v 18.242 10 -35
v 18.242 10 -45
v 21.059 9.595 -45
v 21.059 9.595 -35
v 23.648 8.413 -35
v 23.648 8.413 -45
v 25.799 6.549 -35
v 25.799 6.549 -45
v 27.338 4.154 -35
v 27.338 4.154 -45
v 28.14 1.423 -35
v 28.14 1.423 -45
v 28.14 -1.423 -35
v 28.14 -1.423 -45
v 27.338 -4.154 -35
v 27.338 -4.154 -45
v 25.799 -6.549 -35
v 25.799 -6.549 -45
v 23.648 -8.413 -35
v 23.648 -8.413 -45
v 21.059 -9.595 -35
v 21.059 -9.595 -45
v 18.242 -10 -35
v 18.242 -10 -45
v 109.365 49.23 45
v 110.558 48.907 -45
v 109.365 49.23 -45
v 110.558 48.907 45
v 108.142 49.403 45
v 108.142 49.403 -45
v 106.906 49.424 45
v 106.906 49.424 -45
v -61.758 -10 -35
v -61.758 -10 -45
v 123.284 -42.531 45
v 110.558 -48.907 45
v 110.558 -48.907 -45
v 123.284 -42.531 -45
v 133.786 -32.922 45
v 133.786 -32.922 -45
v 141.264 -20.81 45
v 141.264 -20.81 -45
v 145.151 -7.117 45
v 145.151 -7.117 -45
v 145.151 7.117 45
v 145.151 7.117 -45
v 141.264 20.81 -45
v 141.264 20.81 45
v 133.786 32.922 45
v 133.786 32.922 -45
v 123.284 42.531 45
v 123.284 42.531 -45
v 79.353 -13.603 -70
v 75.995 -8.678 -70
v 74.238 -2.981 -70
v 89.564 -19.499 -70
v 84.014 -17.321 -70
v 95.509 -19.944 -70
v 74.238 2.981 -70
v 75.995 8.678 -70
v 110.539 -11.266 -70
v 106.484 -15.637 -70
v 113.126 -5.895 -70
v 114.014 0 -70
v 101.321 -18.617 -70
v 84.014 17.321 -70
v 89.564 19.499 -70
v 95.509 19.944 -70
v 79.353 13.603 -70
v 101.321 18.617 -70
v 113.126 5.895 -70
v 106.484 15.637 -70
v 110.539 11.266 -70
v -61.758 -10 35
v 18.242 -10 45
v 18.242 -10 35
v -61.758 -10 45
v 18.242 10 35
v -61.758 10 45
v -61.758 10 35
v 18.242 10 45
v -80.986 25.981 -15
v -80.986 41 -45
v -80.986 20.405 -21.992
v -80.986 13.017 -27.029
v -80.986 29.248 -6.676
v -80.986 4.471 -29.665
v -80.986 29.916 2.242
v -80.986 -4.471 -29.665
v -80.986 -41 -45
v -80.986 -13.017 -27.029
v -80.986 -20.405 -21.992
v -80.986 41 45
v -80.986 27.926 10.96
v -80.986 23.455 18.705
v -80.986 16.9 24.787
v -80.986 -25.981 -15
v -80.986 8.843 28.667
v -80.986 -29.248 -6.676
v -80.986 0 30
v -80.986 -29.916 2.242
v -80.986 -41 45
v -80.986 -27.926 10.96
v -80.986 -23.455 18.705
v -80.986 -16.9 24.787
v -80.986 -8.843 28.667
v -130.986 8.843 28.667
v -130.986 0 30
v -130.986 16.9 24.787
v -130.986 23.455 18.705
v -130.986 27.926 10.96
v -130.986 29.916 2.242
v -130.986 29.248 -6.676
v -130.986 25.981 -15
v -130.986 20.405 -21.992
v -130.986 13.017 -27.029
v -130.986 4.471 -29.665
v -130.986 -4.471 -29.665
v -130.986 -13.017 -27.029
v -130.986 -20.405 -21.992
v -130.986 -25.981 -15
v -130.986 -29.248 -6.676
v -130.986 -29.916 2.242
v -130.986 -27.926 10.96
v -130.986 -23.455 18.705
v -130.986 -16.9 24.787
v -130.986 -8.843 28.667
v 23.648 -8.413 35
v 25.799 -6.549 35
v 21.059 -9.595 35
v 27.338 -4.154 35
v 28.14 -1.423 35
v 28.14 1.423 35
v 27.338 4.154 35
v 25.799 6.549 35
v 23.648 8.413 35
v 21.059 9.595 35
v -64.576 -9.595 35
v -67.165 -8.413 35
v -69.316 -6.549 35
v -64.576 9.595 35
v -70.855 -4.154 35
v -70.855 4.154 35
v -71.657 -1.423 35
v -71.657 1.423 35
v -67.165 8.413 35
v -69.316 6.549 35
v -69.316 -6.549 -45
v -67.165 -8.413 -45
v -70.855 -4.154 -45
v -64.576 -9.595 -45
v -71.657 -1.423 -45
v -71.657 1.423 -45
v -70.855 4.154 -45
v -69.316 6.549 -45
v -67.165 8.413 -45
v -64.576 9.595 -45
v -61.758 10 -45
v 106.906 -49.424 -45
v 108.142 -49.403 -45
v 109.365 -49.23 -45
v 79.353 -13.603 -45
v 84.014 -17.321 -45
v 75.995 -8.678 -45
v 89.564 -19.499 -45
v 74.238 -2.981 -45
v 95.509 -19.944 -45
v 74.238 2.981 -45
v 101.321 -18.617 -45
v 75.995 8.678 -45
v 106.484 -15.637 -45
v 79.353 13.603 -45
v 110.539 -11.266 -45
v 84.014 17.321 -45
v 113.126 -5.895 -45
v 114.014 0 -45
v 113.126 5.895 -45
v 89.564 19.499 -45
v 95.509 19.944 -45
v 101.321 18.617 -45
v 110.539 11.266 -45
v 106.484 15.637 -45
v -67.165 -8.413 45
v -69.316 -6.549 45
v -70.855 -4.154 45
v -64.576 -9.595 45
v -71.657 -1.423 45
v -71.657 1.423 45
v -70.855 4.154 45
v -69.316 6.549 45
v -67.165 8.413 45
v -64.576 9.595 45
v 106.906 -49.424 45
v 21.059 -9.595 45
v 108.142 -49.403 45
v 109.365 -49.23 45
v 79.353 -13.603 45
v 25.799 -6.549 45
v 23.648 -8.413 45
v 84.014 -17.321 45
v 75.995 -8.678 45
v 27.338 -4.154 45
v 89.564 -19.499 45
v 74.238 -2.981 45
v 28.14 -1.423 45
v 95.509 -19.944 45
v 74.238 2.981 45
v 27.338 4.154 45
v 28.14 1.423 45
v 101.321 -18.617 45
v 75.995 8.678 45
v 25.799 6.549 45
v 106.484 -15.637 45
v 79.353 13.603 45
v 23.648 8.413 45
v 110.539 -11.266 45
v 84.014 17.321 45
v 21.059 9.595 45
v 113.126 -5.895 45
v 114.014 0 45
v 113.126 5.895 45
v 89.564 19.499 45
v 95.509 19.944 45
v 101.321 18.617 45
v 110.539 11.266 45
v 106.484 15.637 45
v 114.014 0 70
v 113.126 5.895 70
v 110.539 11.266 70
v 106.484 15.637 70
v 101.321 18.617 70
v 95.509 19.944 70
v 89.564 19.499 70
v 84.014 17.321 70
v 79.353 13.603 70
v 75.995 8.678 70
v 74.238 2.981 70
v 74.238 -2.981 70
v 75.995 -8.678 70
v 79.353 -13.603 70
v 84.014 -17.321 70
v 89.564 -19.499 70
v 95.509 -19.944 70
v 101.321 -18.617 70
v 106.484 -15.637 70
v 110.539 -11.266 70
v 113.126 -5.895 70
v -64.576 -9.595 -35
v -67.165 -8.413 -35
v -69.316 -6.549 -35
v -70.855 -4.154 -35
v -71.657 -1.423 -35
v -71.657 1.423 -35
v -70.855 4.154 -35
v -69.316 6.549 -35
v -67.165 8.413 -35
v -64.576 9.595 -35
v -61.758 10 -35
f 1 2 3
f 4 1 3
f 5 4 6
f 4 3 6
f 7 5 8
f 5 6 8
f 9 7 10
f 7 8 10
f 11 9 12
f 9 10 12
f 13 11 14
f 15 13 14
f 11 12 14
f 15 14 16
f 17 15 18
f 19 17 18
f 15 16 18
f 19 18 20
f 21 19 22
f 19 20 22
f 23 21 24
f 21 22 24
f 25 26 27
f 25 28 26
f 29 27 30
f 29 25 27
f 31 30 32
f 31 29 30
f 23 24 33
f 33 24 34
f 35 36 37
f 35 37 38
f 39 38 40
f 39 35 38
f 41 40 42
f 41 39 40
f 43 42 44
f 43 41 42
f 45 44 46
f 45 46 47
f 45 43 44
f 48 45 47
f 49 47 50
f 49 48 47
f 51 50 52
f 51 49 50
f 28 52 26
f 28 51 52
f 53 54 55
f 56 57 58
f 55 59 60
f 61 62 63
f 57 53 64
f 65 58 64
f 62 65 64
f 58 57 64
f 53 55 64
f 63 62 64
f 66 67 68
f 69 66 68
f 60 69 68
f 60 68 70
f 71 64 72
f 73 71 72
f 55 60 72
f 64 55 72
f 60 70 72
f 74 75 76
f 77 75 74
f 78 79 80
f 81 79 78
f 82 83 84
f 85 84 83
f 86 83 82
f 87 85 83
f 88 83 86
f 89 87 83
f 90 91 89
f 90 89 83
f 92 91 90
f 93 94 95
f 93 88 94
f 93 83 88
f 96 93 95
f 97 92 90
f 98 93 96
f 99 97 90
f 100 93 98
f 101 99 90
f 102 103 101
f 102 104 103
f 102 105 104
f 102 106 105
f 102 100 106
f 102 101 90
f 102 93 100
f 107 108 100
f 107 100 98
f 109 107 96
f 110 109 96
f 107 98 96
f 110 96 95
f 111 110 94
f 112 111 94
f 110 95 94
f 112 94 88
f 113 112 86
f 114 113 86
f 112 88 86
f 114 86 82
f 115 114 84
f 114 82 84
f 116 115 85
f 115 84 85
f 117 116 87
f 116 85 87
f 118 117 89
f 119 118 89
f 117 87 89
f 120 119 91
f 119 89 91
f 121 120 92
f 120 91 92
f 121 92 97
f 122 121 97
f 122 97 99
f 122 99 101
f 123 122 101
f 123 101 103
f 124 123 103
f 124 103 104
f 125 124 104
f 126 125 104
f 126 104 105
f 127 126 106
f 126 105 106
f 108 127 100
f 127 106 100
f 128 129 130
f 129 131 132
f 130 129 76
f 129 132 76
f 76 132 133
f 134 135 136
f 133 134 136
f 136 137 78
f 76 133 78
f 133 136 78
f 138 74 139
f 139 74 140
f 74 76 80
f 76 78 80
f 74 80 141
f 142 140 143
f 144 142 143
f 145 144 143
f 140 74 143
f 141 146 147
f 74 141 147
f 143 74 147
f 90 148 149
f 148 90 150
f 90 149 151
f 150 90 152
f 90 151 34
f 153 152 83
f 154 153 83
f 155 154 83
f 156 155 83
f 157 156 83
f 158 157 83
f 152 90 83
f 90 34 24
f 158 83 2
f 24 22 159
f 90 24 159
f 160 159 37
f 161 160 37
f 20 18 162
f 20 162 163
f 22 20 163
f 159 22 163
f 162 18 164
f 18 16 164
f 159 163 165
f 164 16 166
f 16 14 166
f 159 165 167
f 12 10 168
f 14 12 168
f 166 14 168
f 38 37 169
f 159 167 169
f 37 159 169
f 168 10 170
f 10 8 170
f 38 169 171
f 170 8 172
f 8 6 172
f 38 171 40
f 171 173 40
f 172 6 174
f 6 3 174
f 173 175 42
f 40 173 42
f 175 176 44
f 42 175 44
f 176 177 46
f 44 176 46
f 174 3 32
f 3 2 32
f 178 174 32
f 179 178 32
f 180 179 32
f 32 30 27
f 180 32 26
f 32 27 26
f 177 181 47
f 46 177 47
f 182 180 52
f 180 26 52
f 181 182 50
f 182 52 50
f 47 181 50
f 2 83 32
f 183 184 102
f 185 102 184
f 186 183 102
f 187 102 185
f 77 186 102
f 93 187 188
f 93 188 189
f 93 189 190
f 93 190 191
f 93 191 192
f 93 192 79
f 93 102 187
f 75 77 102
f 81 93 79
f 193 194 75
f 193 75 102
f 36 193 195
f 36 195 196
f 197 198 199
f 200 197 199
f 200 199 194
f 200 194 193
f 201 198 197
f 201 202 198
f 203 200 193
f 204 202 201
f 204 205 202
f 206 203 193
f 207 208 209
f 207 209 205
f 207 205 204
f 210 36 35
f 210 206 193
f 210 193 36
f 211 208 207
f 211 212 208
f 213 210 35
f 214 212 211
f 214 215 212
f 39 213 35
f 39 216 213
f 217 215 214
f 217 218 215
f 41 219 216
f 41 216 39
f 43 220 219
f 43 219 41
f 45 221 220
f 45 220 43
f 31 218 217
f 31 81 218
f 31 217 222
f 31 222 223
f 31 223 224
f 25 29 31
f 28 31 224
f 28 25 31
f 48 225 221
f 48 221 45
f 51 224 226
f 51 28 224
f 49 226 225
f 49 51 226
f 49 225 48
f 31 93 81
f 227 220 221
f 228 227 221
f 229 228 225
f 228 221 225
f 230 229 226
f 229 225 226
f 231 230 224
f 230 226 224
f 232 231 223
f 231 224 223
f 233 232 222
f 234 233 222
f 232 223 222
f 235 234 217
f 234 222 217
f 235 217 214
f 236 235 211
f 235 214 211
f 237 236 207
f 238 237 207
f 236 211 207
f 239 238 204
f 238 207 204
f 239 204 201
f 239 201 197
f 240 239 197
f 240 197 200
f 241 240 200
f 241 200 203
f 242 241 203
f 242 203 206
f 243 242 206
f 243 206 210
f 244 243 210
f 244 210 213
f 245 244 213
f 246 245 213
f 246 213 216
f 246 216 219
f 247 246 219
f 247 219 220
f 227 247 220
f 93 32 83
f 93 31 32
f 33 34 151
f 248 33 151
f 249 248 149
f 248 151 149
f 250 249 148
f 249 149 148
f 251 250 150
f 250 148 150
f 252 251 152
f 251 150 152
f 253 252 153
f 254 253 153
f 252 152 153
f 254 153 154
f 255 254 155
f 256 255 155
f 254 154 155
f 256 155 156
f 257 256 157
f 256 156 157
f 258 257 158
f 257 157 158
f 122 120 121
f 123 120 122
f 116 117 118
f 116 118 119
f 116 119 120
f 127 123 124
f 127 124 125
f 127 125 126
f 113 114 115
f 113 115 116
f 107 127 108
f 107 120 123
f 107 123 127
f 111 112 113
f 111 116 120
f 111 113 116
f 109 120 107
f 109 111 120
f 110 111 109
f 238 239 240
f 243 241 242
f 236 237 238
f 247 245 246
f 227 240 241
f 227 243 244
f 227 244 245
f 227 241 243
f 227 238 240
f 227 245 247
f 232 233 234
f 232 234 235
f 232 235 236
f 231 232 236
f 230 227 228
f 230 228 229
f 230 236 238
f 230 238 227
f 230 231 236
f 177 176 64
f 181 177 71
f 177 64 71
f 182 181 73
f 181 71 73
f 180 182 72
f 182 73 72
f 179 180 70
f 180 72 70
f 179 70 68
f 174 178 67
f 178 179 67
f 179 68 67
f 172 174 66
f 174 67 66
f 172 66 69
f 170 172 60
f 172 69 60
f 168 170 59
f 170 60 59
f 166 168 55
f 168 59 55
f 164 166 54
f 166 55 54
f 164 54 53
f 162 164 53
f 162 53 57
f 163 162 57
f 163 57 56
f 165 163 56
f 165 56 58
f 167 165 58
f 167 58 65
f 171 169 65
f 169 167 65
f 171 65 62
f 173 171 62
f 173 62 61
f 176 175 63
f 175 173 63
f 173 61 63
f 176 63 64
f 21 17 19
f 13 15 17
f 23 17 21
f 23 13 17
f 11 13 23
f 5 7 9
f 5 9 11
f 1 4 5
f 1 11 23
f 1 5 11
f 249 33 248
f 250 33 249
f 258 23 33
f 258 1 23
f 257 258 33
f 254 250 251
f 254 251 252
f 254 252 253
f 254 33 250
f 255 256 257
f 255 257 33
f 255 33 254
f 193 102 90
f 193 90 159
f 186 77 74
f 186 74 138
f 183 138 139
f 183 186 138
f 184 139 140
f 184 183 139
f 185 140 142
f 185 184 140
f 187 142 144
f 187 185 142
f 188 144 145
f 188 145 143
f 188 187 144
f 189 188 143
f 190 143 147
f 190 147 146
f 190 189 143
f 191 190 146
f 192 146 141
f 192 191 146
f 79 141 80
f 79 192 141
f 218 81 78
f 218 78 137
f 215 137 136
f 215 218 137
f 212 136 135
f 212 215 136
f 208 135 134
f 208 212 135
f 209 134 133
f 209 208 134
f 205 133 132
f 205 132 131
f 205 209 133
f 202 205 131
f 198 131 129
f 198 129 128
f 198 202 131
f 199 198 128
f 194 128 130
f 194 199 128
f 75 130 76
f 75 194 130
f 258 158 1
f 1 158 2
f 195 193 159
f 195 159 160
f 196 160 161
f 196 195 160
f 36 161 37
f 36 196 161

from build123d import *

# Parameters (mm, degrees)
SKETCH2_R                = 20
BOSS_EXTRUDE1_DEPTH      = 45
SKETCH3_R                = 30
BOSS_EXTRUDE2_DEPTH      = 50
BOSS_EXTRUDE3_DEPTH      = 25
BOSS_EXTRUDE3_DEPTH_BACK = 115
SKETCH4_R                = 20
CUT_EXTRUDE1_DEPTH       = 10


with BuildPart() as part:
    # Sketch2 → Boss-Extrude1 (new, symmetric)
    with BuildSketch(Plane.XY):
        with BuildLine():
            Line((-80.985865724, 41), (-80.985865724, -41))
            Line((-80.985865724, -41), (106.905960483, -49.424273902))
            ThreePointArc((106.905960483, -49.424273902), (108.756170043, -49.335499296), (110.558264434, -48.906999406))
            ThreePointArc((110.558264434, -48.906999406), (145.643610678, 0), (110.558264434, 48.906999406))
            ThreePointArc((110.558264434, 48.906999406), (108.756170043, 49.335499296), (106.905960483, 49.424273902))
            Line((106.905960483, 49.424273902), (-80.985865724, 41))
        make_face()
        with Locations(Location((94.014134276, 0, 0), (0, 0, 180))):
            Circle(SKETCH2_R, mode=Mode.SUBTRACT)
    extrude(amount=BOSS_EXTRUDE1_DEPTH, both=True)

    # Sketch3 → Boss-Extrude2 (add)
    with BuildSketch(Plane.ZY.offset(80.985865724)):
        Circle(SKETCH3_R)
    extrude(amount=BOSS_EXTRUDE2_DEPTH)

    # Sketch4 → Boss-Extrude3 (add, two sides: drawn at the far end of the back side and taken through both)
    with BuildSketch(Plane.XY.offset(45).offset(-BOSS_EXTRUDE3_DEPTH_BACK)):
        with Locations((94.014134276, 0)):
            Circle(SKETCH4_R)
    extrude(amount=BOSS_EXTRUDE3_DEPTH + BOSS_EXTRUDE3_DEPTH_BACK)

    # Sketch5 → Cut-Extrude1 (cut)
    with BuildSketch(Plane.XY.offset(45)):
        with BuildLine():
            Line((-61.758305815, 10), (18.241694185, 10))
            ThreePointArc((18.241694185, 10), (28.241694185, 0), (18.241694185, -10))
            Line((18.241694185, -10), (-61.758305815, -10))
            ThreePointArc((-61.758305815, -10), (-71.758305815, 0), (-61.758305815, 10))
        make_face()
    cut_extrude1 = extrude(amount=-CUT_EXTRUDE1_DEPTH, mode=Mode.SUBTRACT)

    # Mirror1: Cut-Extrude1 across plane
    add(cut_extrude1.mirror(Plane.XY), mode=Mode.SUBTRACT)


solid = part.part
